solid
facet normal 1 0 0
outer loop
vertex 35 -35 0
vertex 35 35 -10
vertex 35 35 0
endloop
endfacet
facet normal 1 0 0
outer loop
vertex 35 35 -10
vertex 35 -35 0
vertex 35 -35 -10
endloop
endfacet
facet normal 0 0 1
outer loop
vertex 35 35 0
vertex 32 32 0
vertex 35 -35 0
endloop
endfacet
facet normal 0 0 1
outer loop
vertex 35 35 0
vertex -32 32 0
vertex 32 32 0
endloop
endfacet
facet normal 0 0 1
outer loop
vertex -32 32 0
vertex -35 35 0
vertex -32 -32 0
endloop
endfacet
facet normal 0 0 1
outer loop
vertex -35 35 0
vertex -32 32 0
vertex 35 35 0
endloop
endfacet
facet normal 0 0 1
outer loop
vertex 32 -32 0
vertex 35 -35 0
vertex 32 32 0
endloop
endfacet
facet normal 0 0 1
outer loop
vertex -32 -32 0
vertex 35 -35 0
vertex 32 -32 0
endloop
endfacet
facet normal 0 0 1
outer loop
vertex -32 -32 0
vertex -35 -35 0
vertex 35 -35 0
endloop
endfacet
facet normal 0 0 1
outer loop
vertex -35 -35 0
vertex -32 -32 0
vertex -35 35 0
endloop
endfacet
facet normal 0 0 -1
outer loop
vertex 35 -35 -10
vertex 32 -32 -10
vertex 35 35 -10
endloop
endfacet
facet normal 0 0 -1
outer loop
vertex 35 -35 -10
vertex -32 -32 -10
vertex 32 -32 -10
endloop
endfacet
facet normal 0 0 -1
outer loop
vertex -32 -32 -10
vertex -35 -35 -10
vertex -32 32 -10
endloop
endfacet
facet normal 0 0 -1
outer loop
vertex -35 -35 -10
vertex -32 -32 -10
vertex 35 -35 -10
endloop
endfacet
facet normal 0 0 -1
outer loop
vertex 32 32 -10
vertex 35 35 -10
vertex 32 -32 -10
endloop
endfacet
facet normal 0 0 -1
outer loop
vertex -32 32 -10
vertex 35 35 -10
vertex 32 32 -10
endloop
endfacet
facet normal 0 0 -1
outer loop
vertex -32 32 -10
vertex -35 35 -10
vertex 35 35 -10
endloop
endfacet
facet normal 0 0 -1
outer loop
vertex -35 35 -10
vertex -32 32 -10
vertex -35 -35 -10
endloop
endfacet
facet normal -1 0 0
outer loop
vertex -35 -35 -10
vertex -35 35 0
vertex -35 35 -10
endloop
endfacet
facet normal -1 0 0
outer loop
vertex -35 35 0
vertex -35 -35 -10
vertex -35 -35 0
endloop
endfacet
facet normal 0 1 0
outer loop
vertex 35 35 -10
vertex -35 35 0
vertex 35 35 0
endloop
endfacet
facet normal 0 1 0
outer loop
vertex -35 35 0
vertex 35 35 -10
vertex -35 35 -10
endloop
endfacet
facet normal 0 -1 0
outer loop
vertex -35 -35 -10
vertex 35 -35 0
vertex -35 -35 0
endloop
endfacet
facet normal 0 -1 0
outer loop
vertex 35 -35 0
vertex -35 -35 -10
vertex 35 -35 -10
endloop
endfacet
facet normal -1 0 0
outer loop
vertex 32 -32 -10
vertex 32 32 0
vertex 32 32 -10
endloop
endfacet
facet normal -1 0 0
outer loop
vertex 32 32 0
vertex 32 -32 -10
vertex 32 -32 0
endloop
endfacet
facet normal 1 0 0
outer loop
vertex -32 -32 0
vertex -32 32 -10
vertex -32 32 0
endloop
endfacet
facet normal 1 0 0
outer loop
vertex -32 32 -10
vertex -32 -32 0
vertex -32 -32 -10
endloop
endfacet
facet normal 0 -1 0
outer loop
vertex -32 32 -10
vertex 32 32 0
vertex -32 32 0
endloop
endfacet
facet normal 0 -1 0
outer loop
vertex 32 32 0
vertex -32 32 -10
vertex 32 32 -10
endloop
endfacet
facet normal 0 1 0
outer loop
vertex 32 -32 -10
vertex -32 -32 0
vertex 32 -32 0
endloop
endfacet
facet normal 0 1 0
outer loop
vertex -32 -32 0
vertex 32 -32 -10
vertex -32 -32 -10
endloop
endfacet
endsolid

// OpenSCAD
// file: definitions.scad
// ============================================================================
// NOTES:
// Definitions file. To be imported via the include <> statement.
// You can render it for test, but do not export to STL.
//
// ============================================================================

//
// GENERAL
//

$fn = 96;
$fn = 8;
$fn = 24;
//$fn = 12;

PLAY = 0.4;
TOLERANCE = 0.17;
ATOM = 0.01;
WALL_THICKNESS = 1;

//
// SERVO (new)
//

SERVO_THICKNESS = 11.5;
SERVO_AXIS_RADIUS = 3;
SERVO_LENGTH = 33.3;

//
// GEARS (new)
//

GEARS_DISTANCE = 14.3;
//echo("GEARS_DISTANCE", GEARS_DISTANCE);

GEARS_THICKNESS = 5;
WHEEL_AXIS_TIGHTEN = TOLERANCE*0.75;
WHEEL_HOLE_DIAMETER = SERVO_AXIS_RADIUS*2 - WHEEL_AXIS_TIGHTEN;

//PINION_RADIUS = 5.6;
//WHEEL_RADIUS = 10.6;
WHEEL_PLATE_HEIGHT = 1;

//    Erlaubte Module nach DIN 780:
//    0.05 0.06 0.08 0.10 0.12 0.16
//    0.20 0.25 0.3  0.4  0.5  0.6
//    0.7  0.8  0.9  1    1.25 1.5
//    2    2.5  3    4    5    6
//    8    10   12   16   20   25
//    32   40   50   60
GEARS_MODULE = 0.65;

ROD_DIAMETER = 3;



// Plate
PLATE_DIAMETER = 50;
PLATE_HEIGHT = 20.5;
PLATES_OVERLAP = 12;

PLATE_HEIGHT_SHORT = 18;


PLATE2_WHEEL_HEIGHT = 2.5;
PLATE2_HEIGHT = PLATE2_WHEEL_HEIGHT + GEARS_THICKNESS;
//echo("PLATE2_HEIGHT", PLATE2_HEIGHT);

PLATE2_GROVE_HEIGHT = 2;
PLATE2_GROVE_THICKNESS = 5;
PLATE2_LEVER_HEIGHT = 2;

PLATE2_BAR_WIDTH = 5;
PLATE2_RADIUS_RECESSION = 1.5;

PLATE2_RADIUS = PLATE_DIAMETER/2 - PLATE2_RADIUS_RECESSION;

BASE_PLATE_CAVITY_DIAMETER = 20;
BASE_PLATE_CROWN_HEIGHT = 9;

// Side screws
SCREW_PLATE_HEIGHT = 1;
SCREW2_DIAMETER = 2.9;
SCREW2_HEAD_DIAMETER = 5.5;
SCREW2_HEAD_THICKNESS = 2;
SCREW2_HEIGHT = 12; // overall

SERVO_SCREW1_H_DISPLACEMENT = 20.5;
SERVO_SCREW2_H_DISPLACEMENT = -9;
SERVO_SCREW_V_DISPLACEMENT = -10.75;
SERVO_SCREW_HEAD_EXTENT = 20;

SERVO_SCREW_THREAD_DIAMETER = 2.5;


HOLDER_ARM_HEIGHT = 13;
HOLDER_ARM_RADIUS_SHORTAGE = 15;
HOLDER_ARM_RADIUS = 4;
HOLDER_ARM_THICKNESS = 6;
HOLDER_THICKNESS = 3;
HOLDER_ANGLE = 35; //20
HOLDER_MODULES_SPACING = 10;


block_cylinder = PLATE_HEIGHT + PLATE2_HEIGHT;
BLOCKS_JOIN = 0.3;
BLOCK1_HEIGHT = block_cylinder*2  + PLAY*2 - PLATE2_HEIGHT;
BLOCK1_HEIGHT_STACKABLE = BLOCK1_HEIGHT + BLOCKS_JOIN;

BLOCK2_HEIGHT = PLATE2_HEIGHT + PLAY*2;
BLOCK2_HEIGHT_STACKABLE = BLOCK2_HEIGHT + BLOCKS_JOIN;
//echo("BLOCK2_HEIGHT (w/o join)", BLOCK2_HEIGHT);

BLOCK3_HEIGHT = block_cylinder*2  + PLAY*2 - PLATE2_HEIGHT;
BLOCK3_HEIGHT_STACKABLE = BLOCK3_HEIGHT + BLOCKS_JOIN;

DIGIT_SEGMENT_WIDTH = 3.5;
DIGIT_SEGMENT_WIDTH = BLOCK2_HEIGHT - PLAY;

// Snapping
SNAP_HOLE_DIAMETER = 4;

CUBE_CROWN_HEIGHT = 3.5;
CUBE_CROWN_SHORT_HEIGHT = 1;
CUBE_LEVER_THICKNESS = 4;
CUBE_SNAP_BALLS_RADIUS = 0.6/2; // <== ADJUST
CUBE_SNAP_BALLS_RADIUS = 0.6/3; // <== ADJUST
CUBE_SNAP_BALLS_RADIUS = 0.6/2.5; // <== ADJUST
CUBE_SNAP_BALLS_K = 3;

PLATE2_Z = BLOCK1_HEIGHT_STACKABLE
         + CUBE_CROWN_HEIGHT
         + BLOCK2_HEIGHT/2
         - PLATE2_WHEEL_HEIGHT/2;

//////////////////////////////////////////////////////////////////////////

//
// SPECIFIC
//

//// Center screw
//SCREW_SHAFT_DIAMETER = 2;
//SCREW_THREAD_DIAMETER = 2.5;
//SCREW_HOLE_LENGTH = 5;



// PLATE 2
PINION_NECK_RADIUS = 6.5;
PINION_SCREW_HEAD_RADIUS = 3 + PLAY;

PINION_THICKNESS = 5.3;
PINION_HEIGHT = PINION_THICKNESS;

BLOCKS_WIDTH = 70;

PLATE2_BOX_INNER_HOLE_DIAMETER = 62;

WHEEL_THICKNESS = 3.5 -0.2;

SERVO_X_ADJUSTMENT = 0.5;
SERVO_X_POSITION = WHEEL_THICKNESS - SCREW_PLATE_HEIGHT
                   + SERVO_X_ADJUSTMENT;
//echo("Servo x pos: ", SERVO_X_POSITION);

HOLDER_RADIUS = 29.5;
HOLDER_SPINE_THICKNESS = 2.5 +1;

ZIP_TIE_SLIT_WIDTH = 3;
ZIP_TIE_SLIT_THICKNESS = 2;
ZIP_TIE_BUMP_RADIUS = 1;

//echo("Total height: ", PLATE_HEIGHT+PLATE2_HEIGHT+PLAY+TOLERANCE);


//
// DIGIT SEGMENTS
// 

SEGMENTS_TOP = ["a", "b", "c", "c", "b", "d", "d", "c", "a", "a"];
SEGMENTS_MID = ["j", "i", "k", "k", "k", "k", "k", "i", "k", "k"];
SEGMENTS_LOW = ["e", "f", "g", "h", "f", "h", "e", "f", "e", "h"];

//
// HELPERS
//

module spoke(radius, width, height) {
    translate([0, 0, height/2])
    intersection() {
        cube([radius*3, width, height], true);

        translate([0, 0, -height/2])
        scale([1, 1, height])
        cylinder(r=radius, true);
    }
}

module barrel(outer_radius, inner_radius, height) {
    scale([1, 1, height])
    difference() {
        cylinder(r=outer_radius);
        translate([0, 0, -0.5]) scale([1, 1, 2])
        cylinder(r=inner_radius);
    }
}

module box_sides(outer_side, thickness, height) {
    scale([1, 1, height/outer_side])
    translate([0, 0, outer_side/2])
    difference() {
        cube(outer_side, true);
        scale([1, 1, 2])
        cube(outer_side - thickness*2, true);
    }
}

module alignment_columns(column_extra=0, height=1) {
    r = PLATE_DIAMETER/2 - PLATE_SCREWS_BORDER_DISTANCE;
    n = 4;
    offset_angle = 45;
    scale([1, 1, height])
    for(a=[0:n-1])
        rotate([0, 0, a*360/n + offset_angle])
        translate([0, r, 0])
        cylinder(r=SNAP_HOLE_DIAMETER/2 + column_extra, true);        
}

function servo_cover_height() =
           PLATE_HEIGHT
           - (WHEEL_EXTERNAL_DIAMETER/2 - PINION_THICKNESS
              + SERVO_THICKNESS/2)
           -TOLERANCE;

module screw(head_extent=0, is_clearance_hole=false) {   
    // thread
    translate([0, 0, -SCREW2_HEIGHT + SCREW2_HEAD_THICKNESS])
    cylinder(h=SCREW2_HEIGHT,
             r=SCREW2_DIAMETER/2 - TOLERANCE
               + (is_clearance_hole ? TOLERANCE*2 : 0));
    // head
    cylinder(h=SCREW2_HEAD_THICKNESS+head_extent, 
             r=SCREW2_HEAD_DIAMETER/2
               +(is_clearance_hole ? PLAY : 0));
}

module flip(height, additional_angle=0) {
        translate([0, 0, height])
        rotate([180, 0, 90-additional_angle])
        children();
}
// main file
include <definitions.scad>

module box(height, wall_thickness) {
	d1 = BLOCKS_WIDTH;
	d2 = d1 - wall_thickness*2;
	translate([0, 0, -height/2])
	difference() {
		cube([d1, d1, height], true);
		cube([d2, d2, height*2], true);
	}
}

box(10, 3);
